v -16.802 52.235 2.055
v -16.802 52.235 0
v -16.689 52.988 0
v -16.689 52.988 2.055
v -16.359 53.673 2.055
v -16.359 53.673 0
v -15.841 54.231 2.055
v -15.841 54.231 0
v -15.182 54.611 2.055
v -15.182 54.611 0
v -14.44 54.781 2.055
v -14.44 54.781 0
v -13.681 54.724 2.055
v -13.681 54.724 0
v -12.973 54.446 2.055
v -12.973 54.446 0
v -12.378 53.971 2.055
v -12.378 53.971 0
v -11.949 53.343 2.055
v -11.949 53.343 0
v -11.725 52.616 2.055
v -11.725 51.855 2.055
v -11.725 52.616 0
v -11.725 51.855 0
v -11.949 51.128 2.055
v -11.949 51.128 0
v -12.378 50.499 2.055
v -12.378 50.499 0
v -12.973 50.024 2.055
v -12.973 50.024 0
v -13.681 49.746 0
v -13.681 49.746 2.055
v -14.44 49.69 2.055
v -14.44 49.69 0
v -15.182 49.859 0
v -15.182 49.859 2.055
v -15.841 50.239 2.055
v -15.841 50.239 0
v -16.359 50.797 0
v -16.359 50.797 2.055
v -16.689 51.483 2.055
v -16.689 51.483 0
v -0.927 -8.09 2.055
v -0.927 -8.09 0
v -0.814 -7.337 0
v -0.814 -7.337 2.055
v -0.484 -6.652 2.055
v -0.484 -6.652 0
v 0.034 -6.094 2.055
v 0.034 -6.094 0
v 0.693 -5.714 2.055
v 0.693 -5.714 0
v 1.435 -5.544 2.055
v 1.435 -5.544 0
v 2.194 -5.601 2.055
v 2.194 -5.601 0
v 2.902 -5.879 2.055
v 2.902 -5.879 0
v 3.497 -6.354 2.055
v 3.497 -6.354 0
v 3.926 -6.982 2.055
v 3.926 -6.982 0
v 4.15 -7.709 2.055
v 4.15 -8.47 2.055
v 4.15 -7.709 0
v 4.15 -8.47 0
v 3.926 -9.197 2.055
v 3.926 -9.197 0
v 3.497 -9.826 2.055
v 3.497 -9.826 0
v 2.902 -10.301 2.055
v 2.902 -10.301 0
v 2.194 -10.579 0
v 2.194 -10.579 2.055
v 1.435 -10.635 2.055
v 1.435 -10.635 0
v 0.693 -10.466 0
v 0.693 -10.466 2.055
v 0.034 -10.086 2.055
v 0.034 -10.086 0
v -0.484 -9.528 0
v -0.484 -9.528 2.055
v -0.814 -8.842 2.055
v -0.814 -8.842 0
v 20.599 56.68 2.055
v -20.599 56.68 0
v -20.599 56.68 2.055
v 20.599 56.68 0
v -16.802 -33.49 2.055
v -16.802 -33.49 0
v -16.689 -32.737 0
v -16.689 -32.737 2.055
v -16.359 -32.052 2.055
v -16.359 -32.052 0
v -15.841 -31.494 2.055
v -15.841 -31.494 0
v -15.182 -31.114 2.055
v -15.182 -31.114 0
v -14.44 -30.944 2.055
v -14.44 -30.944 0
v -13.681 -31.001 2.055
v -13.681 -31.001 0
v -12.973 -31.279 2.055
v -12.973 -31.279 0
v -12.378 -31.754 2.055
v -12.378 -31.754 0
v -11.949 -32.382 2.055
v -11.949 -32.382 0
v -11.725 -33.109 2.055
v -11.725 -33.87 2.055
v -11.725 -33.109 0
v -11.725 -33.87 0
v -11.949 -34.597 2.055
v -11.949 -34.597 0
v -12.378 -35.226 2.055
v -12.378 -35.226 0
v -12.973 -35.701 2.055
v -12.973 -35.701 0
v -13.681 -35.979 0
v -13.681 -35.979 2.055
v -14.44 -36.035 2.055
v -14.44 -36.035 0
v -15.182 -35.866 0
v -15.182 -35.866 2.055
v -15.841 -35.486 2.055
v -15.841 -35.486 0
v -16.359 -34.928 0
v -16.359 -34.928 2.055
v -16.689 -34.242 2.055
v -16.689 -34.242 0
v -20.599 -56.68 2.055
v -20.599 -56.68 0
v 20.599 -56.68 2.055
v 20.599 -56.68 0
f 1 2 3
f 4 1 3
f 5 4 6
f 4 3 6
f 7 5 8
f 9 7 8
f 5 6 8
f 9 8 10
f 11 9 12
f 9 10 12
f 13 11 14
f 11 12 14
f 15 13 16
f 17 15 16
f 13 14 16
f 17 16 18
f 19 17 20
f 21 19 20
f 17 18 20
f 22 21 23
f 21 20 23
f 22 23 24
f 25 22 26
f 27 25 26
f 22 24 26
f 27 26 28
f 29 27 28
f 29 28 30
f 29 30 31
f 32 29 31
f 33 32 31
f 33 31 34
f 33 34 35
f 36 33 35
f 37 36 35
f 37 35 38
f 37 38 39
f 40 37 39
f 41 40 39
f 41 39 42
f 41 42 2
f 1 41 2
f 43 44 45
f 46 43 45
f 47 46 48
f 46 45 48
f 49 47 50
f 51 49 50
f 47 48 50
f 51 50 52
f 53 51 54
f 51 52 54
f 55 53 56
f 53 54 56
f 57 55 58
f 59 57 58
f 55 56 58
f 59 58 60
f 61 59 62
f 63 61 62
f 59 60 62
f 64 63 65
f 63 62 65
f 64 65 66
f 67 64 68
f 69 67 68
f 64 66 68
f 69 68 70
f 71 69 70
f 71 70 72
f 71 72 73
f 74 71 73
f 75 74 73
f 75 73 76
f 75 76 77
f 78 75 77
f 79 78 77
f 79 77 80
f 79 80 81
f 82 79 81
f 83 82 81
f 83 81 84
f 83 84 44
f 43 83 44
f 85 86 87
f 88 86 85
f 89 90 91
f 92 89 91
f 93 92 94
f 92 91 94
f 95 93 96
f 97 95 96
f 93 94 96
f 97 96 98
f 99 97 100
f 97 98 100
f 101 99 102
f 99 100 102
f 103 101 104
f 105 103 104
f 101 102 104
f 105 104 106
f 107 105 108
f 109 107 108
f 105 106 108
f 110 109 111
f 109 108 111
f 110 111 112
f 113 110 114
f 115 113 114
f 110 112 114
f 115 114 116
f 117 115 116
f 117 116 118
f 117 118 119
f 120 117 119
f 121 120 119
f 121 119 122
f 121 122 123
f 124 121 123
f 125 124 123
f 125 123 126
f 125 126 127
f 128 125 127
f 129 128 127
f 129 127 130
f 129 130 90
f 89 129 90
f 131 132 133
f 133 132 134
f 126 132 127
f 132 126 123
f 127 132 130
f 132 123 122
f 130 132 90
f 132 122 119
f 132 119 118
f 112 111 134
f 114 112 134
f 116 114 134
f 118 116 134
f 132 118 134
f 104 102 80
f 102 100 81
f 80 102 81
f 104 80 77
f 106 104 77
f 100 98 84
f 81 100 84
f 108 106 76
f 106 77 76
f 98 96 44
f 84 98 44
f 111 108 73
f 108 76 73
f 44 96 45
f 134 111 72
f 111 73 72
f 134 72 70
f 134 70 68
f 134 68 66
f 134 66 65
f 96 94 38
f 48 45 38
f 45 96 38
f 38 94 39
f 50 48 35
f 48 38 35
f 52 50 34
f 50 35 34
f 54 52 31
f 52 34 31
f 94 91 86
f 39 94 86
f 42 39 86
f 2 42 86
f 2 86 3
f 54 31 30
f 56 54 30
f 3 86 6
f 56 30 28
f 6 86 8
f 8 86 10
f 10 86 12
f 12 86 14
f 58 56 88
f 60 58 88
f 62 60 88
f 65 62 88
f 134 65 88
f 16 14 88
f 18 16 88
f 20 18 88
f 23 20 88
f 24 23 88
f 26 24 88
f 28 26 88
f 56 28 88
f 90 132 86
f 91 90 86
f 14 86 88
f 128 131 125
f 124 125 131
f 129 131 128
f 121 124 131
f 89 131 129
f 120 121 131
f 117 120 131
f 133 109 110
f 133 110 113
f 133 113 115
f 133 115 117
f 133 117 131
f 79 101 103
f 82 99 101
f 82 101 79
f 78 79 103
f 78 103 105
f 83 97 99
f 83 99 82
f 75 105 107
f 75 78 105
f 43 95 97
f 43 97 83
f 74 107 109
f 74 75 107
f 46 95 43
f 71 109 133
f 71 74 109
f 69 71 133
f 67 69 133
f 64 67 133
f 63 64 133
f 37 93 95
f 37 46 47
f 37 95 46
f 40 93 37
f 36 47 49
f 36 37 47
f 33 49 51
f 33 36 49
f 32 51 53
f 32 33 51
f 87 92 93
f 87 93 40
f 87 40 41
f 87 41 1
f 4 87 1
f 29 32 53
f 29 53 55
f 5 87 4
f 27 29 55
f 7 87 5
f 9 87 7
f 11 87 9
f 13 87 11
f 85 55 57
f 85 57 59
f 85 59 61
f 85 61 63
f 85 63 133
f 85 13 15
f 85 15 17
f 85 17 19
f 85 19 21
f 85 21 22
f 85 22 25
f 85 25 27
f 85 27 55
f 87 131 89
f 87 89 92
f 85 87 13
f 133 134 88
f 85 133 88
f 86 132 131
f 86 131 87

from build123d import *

# Parameters (mm, degrees)
SKETCH1_W              = 41.1988
SKETCH1_H              = 113.3602
BOSS_EXTRUDE1_DEPTH    = 2.05486
F_10_CLEARANCE_HOLE1_D = 5.1054


with BuildPart() as part:
    # Sketch1 → Boss-Extrude1 (new body)
    with BuildSketch(Plane.XY):
        Rectangle(SKETCH1_W, SKETCH1_H)
    extrude(amount=BOSS_EXTRUDE1_DEPTH)

    # #10 Clearance Hole1 (through all)
    with Locations(Plane.XY.offset(2.05486)):
        with Locations((-14.2494, 52.2351), (1.6256, -8.0899), (-14.2494, -33.4899)):
            Hole(F_10_CLEARANCE_HOLE1_D / 2)


solid = part.part
